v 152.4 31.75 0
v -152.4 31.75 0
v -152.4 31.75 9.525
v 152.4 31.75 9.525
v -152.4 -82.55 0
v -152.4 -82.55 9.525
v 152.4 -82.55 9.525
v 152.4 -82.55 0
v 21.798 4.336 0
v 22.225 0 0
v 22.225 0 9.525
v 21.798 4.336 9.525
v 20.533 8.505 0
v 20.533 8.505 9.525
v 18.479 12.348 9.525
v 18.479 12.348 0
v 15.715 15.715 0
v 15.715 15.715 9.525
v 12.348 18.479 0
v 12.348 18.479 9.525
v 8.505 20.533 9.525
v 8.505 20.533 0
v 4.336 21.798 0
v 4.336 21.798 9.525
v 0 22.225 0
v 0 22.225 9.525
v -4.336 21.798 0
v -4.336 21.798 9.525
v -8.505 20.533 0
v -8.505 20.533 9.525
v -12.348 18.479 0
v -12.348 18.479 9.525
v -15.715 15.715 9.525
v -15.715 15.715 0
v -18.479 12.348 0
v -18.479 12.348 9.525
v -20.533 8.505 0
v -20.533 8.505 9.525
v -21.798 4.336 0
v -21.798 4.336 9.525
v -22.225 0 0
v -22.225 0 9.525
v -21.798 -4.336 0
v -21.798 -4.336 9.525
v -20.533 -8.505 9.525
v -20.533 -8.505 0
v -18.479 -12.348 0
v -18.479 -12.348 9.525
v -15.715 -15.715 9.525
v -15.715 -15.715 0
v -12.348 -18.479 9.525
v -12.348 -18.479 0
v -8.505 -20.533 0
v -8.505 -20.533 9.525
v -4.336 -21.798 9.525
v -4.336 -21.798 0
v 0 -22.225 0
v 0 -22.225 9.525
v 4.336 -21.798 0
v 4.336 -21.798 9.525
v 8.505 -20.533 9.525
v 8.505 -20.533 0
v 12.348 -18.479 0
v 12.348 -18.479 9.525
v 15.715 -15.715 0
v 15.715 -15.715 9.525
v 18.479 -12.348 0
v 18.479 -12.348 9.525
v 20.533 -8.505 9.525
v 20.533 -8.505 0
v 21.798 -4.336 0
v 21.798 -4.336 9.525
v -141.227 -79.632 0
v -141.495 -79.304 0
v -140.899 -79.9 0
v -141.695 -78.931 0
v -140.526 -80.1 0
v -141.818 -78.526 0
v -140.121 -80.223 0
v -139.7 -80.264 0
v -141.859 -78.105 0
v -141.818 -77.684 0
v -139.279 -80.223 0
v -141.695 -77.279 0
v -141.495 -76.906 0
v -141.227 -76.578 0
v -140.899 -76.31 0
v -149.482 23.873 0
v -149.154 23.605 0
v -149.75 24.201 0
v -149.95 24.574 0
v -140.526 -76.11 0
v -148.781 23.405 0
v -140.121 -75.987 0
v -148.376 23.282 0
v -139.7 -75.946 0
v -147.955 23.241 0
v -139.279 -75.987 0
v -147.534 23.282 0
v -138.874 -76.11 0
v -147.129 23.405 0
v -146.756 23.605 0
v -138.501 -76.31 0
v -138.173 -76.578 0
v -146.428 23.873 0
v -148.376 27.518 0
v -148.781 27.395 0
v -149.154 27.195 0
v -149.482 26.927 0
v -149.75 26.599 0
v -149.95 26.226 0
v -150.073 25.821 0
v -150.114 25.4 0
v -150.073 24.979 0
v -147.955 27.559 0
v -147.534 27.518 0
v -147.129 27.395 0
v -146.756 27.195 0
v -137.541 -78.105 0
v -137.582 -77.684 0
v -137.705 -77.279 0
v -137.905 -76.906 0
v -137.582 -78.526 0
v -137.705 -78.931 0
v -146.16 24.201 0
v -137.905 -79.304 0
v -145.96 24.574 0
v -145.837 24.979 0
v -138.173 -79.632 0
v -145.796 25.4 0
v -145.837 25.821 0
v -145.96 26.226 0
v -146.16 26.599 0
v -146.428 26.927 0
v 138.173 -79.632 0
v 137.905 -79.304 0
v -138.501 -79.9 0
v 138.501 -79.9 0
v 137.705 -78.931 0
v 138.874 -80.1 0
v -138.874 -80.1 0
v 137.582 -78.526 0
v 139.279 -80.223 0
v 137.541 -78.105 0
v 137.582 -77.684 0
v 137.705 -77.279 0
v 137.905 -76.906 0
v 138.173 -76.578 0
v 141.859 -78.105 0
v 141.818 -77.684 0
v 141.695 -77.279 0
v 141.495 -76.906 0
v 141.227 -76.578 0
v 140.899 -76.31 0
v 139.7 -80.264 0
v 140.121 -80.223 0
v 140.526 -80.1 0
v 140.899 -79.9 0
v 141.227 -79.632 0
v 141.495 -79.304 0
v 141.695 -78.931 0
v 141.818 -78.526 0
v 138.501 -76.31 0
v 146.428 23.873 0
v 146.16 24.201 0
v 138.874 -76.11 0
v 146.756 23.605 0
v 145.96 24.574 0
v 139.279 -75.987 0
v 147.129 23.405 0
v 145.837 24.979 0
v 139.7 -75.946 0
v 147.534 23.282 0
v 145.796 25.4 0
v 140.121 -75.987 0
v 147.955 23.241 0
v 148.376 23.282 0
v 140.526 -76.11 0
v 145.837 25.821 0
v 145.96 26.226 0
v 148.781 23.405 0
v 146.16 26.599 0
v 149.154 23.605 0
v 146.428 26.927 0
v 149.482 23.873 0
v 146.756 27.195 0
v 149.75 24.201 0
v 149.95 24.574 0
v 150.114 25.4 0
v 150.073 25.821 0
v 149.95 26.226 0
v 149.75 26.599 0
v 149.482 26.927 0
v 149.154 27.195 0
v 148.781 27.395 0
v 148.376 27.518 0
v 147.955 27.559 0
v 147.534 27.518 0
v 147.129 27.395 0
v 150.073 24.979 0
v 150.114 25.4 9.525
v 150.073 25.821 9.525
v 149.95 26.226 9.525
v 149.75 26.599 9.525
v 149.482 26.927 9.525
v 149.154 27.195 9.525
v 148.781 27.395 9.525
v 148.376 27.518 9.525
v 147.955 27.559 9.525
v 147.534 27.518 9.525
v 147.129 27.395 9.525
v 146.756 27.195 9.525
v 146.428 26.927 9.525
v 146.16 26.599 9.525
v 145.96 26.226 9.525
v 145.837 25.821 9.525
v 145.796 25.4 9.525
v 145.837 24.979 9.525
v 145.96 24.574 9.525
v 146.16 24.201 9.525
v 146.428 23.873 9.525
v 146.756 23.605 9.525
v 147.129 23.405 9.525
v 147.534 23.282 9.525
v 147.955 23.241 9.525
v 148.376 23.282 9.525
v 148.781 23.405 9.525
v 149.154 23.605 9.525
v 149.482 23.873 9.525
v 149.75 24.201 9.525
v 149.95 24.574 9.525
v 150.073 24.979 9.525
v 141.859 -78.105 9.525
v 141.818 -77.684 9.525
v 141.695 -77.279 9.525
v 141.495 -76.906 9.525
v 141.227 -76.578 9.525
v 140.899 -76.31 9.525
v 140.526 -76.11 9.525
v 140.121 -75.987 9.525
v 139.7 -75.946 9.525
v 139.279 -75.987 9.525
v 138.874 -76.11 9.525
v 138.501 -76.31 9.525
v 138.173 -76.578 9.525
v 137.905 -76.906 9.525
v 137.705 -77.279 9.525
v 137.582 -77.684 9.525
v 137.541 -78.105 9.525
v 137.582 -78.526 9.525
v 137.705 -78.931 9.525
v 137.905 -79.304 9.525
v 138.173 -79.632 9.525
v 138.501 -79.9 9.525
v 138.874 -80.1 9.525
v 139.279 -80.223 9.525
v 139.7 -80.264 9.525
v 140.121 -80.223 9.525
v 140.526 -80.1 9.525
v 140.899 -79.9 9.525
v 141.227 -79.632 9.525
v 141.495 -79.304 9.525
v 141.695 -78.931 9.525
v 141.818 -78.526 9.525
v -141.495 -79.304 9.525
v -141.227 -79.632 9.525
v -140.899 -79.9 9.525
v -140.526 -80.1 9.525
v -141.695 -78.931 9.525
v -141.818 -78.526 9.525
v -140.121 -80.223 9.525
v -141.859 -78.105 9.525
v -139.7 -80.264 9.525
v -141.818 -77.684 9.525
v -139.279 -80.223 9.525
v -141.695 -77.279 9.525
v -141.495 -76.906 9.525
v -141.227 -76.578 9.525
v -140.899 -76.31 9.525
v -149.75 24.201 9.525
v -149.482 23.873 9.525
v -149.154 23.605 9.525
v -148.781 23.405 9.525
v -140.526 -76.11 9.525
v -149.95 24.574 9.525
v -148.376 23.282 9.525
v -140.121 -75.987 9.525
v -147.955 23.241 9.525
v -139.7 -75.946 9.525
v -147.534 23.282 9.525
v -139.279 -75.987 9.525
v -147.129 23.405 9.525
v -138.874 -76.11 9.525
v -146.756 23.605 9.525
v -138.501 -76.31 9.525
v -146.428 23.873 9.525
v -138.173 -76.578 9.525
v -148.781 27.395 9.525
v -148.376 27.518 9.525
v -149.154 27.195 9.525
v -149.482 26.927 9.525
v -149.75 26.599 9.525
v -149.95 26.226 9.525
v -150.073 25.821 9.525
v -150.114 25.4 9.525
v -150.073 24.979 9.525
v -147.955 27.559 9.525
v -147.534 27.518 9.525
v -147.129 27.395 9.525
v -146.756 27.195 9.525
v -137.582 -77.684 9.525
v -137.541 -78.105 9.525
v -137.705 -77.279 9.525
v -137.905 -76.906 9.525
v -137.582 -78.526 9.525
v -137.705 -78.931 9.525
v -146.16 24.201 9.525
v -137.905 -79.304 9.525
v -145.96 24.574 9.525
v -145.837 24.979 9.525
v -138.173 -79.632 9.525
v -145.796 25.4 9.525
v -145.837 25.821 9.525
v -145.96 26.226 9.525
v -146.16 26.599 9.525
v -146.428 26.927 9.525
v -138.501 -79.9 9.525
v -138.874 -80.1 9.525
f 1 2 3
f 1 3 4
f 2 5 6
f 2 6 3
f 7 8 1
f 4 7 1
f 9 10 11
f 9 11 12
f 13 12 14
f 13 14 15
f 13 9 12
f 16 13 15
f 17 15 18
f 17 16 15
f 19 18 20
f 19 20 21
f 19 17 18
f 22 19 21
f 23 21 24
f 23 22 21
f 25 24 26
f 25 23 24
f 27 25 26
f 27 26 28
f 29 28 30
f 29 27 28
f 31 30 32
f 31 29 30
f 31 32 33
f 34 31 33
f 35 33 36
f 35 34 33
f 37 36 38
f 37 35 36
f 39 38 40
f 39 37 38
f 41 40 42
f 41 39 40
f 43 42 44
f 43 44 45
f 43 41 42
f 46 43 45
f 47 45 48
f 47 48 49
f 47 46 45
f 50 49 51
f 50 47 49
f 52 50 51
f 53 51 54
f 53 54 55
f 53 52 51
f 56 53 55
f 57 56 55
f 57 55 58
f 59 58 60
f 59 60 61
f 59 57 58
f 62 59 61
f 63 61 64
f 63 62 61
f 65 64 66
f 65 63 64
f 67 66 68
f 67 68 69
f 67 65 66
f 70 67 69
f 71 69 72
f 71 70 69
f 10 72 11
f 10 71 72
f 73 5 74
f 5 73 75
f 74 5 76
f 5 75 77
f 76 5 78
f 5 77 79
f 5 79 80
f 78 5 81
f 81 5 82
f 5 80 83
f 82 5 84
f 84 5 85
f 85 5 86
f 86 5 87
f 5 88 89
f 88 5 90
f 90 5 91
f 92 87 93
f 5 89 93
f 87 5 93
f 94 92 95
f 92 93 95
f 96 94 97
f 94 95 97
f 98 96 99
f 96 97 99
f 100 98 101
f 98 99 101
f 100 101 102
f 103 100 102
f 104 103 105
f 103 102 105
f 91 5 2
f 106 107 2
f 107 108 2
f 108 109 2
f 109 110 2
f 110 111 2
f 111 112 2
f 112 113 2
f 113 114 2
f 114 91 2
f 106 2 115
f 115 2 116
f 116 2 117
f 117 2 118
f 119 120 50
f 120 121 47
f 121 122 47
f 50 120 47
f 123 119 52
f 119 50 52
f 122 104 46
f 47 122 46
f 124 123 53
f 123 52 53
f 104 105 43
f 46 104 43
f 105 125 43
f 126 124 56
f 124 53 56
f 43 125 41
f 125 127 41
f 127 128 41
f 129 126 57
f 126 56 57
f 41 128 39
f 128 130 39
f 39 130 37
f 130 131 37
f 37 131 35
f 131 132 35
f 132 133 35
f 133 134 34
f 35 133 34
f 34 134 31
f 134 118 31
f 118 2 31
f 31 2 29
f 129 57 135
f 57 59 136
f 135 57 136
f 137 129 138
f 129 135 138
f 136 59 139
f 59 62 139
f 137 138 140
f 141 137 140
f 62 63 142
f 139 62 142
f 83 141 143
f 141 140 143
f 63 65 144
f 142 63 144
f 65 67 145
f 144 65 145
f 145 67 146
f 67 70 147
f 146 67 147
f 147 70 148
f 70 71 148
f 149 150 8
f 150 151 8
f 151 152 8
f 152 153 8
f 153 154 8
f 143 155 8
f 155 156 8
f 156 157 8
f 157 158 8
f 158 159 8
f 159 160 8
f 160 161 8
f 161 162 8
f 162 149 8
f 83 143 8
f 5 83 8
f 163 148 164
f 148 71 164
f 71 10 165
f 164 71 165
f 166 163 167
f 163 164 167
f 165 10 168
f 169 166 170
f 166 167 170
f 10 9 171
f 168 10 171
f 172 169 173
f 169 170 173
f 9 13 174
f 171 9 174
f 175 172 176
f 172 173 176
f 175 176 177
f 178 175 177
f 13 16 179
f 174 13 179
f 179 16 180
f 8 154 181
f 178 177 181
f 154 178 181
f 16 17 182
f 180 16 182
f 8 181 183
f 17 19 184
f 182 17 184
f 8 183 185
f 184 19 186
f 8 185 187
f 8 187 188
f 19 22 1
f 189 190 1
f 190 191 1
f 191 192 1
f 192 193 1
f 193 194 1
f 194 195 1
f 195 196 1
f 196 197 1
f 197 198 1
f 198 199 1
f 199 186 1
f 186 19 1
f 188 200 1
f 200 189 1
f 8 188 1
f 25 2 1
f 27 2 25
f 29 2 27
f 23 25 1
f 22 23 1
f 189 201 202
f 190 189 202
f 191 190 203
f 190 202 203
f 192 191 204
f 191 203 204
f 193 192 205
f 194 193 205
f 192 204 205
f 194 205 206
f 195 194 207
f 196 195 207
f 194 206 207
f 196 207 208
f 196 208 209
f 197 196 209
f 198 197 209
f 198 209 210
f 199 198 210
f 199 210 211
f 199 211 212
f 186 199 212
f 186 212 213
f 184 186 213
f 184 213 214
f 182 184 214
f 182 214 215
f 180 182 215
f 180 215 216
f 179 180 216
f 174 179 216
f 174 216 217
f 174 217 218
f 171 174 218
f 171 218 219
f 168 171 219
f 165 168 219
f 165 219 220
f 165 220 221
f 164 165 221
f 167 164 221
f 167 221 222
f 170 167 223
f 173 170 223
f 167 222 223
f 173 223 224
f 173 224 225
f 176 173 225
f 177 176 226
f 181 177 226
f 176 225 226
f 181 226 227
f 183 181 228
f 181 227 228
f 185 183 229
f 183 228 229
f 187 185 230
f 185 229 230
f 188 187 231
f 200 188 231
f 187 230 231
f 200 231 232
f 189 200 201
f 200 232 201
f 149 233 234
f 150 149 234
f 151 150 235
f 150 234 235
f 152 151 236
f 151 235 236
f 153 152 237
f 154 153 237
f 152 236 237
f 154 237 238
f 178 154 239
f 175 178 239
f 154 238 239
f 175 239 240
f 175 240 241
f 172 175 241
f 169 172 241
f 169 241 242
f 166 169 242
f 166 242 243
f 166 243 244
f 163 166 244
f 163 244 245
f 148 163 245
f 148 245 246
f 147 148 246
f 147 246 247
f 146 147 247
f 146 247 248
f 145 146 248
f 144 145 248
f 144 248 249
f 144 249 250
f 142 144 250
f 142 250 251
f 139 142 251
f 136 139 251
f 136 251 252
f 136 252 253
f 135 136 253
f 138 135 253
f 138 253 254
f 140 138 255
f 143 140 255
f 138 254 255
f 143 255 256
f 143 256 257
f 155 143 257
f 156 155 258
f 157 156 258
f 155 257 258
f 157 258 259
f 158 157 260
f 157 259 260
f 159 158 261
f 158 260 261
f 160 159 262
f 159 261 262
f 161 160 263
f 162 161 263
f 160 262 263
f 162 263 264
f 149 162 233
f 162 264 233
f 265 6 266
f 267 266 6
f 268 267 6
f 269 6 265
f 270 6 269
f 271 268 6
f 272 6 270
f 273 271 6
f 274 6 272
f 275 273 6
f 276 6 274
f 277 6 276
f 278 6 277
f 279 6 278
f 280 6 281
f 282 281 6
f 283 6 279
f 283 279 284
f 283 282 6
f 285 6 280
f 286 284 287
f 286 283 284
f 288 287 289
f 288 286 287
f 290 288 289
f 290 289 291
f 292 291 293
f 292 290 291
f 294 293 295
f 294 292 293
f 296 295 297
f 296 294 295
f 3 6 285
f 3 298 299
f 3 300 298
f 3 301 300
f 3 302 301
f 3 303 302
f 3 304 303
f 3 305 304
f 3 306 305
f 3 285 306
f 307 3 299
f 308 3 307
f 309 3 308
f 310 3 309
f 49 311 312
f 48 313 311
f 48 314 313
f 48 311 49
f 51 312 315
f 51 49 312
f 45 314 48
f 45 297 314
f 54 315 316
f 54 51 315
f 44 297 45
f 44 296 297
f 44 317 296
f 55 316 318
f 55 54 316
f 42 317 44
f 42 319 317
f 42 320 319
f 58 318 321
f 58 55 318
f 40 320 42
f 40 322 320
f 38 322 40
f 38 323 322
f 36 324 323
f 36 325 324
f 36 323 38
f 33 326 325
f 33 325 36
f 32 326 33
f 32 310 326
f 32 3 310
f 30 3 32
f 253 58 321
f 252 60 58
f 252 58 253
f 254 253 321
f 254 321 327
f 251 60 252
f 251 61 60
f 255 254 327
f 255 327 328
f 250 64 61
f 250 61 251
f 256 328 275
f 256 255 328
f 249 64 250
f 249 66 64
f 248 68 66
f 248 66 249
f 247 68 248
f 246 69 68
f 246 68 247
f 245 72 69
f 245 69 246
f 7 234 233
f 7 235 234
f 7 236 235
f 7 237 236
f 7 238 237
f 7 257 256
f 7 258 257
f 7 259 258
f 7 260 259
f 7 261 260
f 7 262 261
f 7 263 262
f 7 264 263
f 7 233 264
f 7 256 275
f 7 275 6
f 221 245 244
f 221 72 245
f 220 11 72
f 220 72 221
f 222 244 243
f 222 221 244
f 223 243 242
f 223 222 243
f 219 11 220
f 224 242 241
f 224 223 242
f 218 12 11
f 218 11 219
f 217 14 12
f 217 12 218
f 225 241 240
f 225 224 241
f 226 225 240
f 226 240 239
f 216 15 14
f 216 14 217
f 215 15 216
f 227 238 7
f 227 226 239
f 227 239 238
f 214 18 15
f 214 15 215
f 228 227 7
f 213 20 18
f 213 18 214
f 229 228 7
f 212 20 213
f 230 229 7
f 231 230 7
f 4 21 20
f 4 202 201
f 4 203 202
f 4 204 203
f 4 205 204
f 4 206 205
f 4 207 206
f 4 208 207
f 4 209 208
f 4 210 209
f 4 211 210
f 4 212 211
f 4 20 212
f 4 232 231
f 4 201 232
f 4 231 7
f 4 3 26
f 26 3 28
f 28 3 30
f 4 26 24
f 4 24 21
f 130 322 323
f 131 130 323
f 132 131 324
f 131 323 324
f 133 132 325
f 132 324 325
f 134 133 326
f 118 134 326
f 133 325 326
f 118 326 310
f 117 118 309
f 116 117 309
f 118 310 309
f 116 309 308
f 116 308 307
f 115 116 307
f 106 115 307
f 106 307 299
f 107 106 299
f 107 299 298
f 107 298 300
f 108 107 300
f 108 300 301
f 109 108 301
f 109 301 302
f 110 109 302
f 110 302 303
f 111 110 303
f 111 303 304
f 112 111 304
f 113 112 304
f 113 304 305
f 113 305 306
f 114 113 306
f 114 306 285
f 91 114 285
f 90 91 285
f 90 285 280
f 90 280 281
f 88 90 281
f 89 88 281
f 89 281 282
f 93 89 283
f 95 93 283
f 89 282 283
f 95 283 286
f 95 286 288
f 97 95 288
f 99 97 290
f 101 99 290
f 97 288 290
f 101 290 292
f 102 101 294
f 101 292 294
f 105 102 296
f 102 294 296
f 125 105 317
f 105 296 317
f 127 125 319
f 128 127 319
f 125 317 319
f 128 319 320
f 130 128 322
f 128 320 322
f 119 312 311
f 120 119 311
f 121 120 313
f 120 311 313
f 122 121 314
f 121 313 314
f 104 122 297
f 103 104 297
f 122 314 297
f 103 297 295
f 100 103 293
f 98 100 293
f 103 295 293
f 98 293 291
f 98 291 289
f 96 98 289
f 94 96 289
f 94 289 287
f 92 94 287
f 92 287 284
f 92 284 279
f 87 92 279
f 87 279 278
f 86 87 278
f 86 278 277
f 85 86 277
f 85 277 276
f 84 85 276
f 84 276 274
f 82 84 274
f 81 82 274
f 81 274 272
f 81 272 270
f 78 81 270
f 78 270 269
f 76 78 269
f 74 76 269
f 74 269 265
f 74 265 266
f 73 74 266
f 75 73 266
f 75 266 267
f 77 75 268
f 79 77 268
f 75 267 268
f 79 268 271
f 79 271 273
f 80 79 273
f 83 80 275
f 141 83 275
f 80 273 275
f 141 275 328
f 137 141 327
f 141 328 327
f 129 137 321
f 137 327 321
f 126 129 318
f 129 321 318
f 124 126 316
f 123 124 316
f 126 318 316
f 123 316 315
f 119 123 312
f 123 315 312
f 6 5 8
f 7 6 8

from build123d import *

# Parameters (mm, degrees)
SKETCH1_W           = 304.8
SKETCH1_H           = 114.3
SKETCH1_R           = 22.225
BOSS_EXTRUDE1_DEPTH = 9.525
SKETCH2_R           = 2.159
CUT_EXTRUDE1_DEPTH  = 10.525


with BuildPart() as part:
    # Sketch1 → Boss-Extrude1 (new body)
    with BuildSketch(Plane.XY):
        with Locations((0, -25.4)):
            Rectangle(SKETCH1_W, SKETCH1_H)
        Circle(SKETCH1_R, mode=Mode.SUBTRACT)
    extrude(amount=BOSS_EXTRUDE1_DEPTH)

    # Sketch2 → Cut-Extrude1 (cut, through all)
    with BuildSketch(Plane.XY.offset(9.525)):
        with Locations((-139.7, -78.105)):
            Circle(SKETCH2_R)
        with Locations((-147.955, 25.4)):
            Circle(SKETCH2_R)
        with Locations((147.955, 25.4)):
            Circle(SKETCH2_R)
        with Locations((139.7, -78.105)):
            Circle(SKETCH2_R)
    extrude(amount=-CUT_EXTRUDE1_DEPTH, mode=Mode.SUBTRACT)


solid = part.part
